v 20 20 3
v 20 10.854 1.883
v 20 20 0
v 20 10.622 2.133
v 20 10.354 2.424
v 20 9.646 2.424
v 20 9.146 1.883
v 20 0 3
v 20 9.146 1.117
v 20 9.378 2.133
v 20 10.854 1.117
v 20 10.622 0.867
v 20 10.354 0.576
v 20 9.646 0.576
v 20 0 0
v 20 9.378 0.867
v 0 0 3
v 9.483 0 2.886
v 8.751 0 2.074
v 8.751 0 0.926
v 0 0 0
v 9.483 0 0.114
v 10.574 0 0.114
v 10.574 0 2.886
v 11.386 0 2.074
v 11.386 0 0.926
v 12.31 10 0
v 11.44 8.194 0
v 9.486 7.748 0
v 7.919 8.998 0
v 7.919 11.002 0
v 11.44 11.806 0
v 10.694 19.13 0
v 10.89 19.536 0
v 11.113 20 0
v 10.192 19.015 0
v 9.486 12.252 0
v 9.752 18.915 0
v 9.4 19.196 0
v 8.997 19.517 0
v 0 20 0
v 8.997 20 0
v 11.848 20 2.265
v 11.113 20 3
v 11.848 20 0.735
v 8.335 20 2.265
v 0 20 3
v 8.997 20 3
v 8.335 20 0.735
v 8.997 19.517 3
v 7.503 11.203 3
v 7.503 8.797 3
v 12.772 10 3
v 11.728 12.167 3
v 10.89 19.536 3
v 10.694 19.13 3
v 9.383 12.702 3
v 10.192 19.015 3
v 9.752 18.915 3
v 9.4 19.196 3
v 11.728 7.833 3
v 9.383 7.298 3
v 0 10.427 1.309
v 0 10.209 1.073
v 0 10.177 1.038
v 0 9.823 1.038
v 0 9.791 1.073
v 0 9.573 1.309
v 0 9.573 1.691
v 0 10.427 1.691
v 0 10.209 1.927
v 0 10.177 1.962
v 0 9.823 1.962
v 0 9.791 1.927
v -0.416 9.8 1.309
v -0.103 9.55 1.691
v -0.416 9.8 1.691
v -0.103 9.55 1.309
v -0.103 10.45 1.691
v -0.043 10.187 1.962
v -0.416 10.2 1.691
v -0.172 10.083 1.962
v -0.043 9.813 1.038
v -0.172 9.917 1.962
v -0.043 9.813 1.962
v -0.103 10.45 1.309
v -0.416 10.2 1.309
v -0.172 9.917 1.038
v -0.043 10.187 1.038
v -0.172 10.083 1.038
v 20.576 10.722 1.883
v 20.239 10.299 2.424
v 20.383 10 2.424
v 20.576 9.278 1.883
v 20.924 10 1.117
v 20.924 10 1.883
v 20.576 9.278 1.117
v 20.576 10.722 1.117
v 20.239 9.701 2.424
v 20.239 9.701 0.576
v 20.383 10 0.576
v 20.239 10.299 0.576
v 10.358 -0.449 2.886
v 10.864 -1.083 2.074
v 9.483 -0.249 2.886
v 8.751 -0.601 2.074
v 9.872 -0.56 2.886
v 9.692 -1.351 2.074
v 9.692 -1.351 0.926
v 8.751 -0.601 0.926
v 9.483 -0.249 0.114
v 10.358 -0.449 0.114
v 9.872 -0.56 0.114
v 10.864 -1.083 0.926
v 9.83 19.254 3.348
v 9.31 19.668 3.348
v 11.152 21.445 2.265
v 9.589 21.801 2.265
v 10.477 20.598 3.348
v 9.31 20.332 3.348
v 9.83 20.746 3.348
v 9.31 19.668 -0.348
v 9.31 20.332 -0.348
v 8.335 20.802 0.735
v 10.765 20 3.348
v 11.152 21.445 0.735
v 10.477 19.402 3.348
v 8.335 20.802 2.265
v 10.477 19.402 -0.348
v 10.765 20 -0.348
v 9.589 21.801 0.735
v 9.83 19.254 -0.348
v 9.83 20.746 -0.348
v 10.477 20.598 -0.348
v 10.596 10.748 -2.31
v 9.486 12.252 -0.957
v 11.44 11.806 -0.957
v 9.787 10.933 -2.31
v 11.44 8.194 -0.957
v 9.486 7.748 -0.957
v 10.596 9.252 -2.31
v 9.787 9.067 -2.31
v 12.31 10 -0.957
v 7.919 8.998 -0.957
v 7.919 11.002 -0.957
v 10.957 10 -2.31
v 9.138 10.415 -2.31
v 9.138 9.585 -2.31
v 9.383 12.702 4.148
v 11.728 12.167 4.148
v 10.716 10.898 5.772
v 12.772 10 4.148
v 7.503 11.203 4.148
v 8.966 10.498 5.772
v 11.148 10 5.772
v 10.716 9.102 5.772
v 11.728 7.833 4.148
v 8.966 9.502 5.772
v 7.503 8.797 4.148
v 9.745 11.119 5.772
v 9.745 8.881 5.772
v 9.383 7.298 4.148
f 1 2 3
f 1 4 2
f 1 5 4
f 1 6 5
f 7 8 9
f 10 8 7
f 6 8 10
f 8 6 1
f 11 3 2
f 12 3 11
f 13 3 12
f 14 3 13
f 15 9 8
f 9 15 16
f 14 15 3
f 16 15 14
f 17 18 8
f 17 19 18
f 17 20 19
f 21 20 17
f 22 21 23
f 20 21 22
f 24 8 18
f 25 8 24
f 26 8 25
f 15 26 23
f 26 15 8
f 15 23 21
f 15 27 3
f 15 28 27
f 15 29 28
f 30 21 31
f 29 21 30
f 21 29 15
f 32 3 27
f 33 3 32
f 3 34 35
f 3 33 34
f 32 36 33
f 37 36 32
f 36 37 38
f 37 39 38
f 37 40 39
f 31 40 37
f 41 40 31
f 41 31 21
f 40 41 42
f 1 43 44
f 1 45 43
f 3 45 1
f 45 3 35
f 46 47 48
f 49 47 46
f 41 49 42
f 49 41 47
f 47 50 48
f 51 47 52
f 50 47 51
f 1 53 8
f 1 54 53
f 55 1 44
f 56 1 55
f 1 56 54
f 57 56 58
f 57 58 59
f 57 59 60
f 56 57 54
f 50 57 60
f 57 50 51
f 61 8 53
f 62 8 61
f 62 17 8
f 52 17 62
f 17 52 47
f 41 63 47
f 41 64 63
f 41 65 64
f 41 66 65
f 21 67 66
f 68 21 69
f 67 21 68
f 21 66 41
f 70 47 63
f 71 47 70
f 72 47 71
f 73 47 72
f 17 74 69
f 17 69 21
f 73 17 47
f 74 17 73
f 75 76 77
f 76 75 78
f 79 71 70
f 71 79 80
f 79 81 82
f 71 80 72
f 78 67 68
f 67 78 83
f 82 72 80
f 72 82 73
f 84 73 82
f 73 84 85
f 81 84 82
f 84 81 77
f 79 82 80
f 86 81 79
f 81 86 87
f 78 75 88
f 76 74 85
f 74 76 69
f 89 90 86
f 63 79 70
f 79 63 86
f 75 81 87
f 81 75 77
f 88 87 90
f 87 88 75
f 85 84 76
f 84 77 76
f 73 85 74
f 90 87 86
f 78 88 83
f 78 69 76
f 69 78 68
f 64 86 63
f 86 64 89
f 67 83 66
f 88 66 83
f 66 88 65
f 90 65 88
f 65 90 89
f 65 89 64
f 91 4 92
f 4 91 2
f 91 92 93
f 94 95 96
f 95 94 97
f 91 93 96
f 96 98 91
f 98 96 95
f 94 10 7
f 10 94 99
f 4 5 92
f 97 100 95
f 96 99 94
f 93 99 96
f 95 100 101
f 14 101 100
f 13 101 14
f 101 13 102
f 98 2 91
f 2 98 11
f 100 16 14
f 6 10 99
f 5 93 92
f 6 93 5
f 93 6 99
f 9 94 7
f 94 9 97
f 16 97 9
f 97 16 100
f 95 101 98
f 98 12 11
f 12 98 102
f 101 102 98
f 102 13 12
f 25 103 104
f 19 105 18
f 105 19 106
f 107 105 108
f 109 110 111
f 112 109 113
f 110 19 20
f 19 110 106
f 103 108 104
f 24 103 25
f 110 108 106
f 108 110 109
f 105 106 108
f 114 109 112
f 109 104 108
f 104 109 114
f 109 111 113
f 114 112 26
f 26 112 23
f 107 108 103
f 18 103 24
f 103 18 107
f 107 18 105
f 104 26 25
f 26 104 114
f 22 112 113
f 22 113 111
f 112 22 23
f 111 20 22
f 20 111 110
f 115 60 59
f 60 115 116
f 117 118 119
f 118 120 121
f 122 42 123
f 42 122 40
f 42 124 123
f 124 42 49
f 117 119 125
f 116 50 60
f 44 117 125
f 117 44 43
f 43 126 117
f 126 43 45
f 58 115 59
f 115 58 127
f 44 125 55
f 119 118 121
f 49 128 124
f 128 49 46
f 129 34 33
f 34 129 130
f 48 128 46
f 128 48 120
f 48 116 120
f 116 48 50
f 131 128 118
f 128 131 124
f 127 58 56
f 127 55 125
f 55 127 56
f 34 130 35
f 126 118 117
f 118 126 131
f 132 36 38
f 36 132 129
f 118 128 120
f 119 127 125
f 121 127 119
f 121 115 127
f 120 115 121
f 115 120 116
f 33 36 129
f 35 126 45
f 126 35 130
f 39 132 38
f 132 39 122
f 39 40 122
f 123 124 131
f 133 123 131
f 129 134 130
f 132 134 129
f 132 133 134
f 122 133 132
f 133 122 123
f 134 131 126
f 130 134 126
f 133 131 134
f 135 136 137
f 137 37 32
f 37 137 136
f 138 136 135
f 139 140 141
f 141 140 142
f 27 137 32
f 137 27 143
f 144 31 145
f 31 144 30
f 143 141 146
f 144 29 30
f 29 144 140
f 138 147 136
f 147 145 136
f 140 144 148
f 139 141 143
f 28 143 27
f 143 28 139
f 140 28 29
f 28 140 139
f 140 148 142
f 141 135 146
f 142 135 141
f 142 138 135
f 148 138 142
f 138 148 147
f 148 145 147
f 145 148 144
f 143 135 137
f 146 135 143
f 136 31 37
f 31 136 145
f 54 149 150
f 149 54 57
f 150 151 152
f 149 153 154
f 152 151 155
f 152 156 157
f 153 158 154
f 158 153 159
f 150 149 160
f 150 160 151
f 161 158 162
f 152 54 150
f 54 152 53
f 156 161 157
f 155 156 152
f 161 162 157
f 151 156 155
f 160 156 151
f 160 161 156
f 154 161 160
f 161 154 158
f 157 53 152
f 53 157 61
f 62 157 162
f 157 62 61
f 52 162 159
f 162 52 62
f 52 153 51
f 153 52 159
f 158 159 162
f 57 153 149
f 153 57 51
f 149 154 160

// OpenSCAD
$fn=7;
union()
{
	hull()
	{
		translate([0,0,0])
		{
			rotate(0,[0,0,1])
			{
				cube([3,3,3]);
			}
		}
		translate([0,17,0])
		{
			rotate(0,[0,0,1])
			{
				cube([3,3,3]);
			}
		}
		translate([17,17,0])
		{
			rotate(0,[0,0,1])
			{
				cube([3,3,3]);
			}
		}
		translate([17,0,0])
		{
			rotate(0,[0,0,1])
			{
				cube([3,3,3]);
			}
		}
	}
	translate([0,10,1.5])
	{
		rotate(0,[0,0,1])
		{
			sphere(d=1);
		}
	}
	translate([20,10,1.5])
	{
		rotate(0,[0,0,1])
		{
			sphere(d=2);
		}
	}
	translate([10,0,1.5])
	{
		rotate(0,[0,0,1])
		{
			sphere(d=3);
		}
	}
	translate([10,20,1.5])
	{
		rotate(0,[0,0,1])
		{
			sphere(d=4);
		}
	}
	translate([10,10,0])
	{
		rotate(0,[0,0,1])
		{
			sphere(d=5);
		}
	}
	translate([10,10,3])
	{
		rotate(0,[0,0,1])
		{
			sphere(d=6);
		}
	}
}
